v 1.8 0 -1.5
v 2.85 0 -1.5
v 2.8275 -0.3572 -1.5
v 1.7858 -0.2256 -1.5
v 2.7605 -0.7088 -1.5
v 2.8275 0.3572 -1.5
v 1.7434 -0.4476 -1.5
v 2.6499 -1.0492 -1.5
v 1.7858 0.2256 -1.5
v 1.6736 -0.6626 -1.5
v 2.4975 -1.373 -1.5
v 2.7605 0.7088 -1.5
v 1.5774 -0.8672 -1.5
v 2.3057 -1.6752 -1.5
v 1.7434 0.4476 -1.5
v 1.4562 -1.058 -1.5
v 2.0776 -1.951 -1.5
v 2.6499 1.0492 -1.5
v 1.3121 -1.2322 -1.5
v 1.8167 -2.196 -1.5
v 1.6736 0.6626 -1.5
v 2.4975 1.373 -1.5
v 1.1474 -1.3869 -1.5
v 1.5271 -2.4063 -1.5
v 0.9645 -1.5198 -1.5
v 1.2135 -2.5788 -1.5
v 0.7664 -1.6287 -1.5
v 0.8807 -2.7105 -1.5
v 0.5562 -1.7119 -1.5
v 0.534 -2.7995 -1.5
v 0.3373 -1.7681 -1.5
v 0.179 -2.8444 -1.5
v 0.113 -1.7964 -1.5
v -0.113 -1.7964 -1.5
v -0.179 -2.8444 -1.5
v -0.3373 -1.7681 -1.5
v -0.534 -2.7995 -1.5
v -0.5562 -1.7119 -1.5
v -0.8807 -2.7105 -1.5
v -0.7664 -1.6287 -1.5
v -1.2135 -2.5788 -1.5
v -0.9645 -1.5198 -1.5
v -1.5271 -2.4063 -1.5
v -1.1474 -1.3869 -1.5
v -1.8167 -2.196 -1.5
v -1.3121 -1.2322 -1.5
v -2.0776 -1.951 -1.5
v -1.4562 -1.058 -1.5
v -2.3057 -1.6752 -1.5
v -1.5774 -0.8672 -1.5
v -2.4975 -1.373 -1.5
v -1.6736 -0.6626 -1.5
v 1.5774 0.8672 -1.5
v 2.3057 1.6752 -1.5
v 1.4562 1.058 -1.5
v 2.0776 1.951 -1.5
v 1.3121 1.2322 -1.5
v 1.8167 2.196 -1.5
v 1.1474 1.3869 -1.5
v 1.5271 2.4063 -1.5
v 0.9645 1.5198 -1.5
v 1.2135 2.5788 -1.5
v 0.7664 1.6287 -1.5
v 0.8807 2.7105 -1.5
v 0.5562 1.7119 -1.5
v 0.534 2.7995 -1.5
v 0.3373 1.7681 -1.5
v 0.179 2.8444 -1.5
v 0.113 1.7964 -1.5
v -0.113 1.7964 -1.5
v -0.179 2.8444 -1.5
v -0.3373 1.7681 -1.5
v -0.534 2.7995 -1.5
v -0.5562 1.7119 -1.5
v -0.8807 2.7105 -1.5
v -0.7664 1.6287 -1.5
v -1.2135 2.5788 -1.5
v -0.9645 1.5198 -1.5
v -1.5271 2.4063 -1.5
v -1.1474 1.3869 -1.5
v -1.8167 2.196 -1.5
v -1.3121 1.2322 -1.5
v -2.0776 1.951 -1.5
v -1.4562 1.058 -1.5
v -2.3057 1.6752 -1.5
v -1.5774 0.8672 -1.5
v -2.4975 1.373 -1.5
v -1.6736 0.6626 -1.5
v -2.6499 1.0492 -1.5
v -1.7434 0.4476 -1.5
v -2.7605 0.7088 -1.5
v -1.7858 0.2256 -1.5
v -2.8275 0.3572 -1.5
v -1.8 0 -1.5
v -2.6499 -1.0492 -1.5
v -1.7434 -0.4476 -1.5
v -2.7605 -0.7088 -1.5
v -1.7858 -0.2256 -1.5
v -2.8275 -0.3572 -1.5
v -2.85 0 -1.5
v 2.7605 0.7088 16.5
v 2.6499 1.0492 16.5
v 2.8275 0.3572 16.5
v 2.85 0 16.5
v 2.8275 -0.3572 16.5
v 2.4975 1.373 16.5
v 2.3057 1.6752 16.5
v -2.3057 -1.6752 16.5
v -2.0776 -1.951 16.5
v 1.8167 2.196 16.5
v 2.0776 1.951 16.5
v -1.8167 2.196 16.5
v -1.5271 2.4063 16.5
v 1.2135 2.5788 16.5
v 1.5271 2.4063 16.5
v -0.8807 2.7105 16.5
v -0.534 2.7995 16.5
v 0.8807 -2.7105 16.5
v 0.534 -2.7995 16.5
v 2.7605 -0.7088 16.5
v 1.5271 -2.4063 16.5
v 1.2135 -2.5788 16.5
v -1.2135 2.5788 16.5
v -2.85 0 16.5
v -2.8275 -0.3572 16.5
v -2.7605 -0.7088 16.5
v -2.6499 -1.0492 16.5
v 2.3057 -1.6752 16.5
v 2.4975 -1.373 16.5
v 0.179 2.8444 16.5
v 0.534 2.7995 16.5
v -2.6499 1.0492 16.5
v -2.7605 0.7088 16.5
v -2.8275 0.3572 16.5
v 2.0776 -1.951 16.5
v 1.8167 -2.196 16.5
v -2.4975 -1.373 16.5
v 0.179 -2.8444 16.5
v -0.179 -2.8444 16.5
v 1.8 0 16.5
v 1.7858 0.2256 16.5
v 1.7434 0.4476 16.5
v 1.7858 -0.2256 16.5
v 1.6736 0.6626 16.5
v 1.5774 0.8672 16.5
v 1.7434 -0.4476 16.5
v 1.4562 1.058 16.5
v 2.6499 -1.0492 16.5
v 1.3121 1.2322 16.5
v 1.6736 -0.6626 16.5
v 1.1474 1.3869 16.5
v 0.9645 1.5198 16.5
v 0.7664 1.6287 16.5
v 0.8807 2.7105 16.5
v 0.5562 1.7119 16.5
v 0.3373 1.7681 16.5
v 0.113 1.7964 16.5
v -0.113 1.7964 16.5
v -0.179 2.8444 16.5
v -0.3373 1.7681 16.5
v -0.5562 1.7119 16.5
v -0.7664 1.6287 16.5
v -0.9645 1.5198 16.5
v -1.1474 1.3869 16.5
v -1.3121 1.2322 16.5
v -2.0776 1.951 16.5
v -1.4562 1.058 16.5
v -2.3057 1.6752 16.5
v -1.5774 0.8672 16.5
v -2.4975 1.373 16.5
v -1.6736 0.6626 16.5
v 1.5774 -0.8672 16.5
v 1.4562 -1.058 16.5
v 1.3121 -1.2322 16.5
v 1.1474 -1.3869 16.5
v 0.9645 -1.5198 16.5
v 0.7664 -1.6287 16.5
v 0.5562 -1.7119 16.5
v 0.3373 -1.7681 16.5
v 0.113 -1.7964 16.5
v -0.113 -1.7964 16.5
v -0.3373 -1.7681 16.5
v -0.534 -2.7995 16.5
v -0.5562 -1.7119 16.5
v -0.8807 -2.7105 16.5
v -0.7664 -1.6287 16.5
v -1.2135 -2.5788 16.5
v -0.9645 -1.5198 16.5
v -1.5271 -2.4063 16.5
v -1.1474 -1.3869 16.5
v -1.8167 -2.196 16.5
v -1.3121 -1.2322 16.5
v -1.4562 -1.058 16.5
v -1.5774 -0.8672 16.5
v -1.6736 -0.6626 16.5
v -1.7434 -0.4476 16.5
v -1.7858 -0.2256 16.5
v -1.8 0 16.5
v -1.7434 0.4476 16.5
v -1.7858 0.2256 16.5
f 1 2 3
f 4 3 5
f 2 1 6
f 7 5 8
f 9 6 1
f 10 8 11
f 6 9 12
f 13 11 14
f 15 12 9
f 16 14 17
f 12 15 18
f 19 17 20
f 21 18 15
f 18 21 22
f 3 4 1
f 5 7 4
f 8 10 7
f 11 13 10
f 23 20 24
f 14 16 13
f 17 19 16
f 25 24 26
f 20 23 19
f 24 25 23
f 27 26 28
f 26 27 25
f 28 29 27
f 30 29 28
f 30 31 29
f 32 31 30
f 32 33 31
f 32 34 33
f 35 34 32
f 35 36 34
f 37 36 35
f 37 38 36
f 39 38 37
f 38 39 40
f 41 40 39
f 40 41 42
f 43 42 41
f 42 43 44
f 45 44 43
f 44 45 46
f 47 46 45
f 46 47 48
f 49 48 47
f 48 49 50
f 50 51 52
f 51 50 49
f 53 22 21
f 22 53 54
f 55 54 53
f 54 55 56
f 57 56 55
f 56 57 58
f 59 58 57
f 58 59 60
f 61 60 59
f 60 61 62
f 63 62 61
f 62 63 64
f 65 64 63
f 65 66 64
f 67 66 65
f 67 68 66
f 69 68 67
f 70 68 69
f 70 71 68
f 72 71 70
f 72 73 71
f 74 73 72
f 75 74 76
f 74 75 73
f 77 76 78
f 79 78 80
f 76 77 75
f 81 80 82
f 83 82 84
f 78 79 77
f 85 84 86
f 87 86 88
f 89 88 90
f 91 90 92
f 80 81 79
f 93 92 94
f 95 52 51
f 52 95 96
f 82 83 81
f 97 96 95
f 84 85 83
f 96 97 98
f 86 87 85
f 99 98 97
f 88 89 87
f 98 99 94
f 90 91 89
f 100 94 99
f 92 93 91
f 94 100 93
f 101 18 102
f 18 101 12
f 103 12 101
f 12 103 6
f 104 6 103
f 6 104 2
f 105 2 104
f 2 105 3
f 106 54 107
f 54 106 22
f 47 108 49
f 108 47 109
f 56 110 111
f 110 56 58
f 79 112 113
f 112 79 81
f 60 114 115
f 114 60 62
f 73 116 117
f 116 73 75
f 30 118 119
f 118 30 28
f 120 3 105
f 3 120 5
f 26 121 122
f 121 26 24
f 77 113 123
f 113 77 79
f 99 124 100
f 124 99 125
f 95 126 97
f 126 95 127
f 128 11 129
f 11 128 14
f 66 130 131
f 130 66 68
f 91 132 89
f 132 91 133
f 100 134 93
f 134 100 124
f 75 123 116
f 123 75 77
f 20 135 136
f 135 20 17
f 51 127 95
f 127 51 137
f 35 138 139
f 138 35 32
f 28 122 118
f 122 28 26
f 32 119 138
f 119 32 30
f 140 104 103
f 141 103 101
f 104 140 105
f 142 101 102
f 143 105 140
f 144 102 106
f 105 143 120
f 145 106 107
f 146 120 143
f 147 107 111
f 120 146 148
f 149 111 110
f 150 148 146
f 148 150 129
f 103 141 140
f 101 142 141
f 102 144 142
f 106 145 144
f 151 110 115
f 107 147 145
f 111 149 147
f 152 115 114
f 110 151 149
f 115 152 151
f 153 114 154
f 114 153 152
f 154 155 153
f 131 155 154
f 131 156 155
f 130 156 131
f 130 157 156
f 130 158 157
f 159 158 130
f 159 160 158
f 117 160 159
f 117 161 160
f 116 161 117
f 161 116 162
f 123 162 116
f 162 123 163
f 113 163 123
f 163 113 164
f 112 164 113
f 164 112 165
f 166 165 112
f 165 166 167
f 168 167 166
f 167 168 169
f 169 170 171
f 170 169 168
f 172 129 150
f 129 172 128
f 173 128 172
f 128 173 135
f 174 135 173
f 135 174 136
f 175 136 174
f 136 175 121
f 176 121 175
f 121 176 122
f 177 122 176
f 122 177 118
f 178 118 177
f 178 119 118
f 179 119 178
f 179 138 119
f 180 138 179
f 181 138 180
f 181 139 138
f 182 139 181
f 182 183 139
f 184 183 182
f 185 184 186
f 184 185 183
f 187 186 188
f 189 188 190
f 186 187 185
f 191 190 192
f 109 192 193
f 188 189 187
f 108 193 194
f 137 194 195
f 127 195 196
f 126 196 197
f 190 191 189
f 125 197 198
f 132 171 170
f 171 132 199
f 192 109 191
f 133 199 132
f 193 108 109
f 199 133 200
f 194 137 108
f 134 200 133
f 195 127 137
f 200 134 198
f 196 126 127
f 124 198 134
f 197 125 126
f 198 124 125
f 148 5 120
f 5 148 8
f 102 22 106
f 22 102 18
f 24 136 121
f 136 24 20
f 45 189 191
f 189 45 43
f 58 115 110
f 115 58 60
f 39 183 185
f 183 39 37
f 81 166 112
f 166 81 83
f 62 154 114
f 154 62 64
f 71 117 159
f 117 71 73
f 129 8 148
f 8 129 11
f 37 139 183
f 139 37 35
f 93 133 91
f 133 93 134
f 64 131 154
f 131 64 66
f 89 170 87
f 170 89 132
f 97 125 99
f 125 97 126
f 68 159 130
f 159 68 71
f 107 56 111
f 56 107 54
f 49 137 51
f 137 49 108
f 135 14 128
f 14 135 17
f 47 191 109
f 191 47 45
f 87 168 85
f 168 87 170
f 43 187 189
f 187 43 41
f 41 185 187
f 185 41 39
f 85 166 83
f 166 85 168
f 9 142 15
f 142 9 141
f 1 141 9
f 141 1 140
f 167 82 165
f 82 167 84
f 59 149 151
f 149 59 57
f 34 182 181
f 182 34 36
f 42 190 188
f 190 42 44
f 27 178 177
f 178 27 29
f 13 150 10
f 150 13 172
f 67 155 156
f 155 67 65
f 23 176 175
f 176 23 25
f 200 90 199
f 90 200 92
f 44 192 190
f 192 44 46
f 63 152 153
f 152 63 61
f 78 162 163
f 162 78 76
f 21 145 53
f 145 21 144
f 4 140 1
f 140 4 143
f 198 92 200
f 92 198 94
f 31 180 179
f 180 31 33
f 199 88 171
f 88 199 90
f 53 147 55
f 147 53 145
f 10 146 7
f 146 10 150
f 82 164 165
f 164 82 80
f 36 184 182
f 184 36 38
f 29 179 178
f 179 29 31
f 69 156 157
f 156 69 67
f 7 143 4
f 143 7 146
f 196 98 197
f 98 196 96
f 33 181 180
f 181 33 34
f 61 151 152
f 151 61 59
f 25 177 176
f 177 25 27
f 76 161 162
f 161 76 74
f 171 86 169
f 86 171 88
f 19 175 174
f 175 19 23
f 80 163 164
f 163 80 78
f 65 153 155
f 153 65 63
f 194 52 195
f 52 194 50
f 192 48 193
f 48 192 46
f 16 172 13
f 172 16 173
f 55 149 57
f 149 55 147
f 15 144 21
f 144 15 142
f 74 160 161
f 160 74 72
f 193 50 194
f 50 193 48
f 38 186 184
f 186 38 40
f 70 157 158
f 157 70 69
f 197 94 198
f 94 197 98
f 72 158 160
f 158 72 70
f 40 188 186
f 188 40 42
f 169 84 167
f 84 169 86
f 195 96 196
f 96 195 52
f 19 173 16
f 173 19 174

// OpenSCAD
$fn = 50;


difference() {
	union() {
		translate(v = [0, 0, -1.5000000000]) {
			cylinder(h = 3, r = 1.0000000000);
		}
		translate(v = [0, 0, -1.5000000000]) {
			cylinder(h = 18, r = 2.8500000000);
		}
	}
	union() {
		translate(v = [0, 0, -50.0000000000]) {
			cylinder(h = 100, r = 1.8000000000);
		}
	}
}
